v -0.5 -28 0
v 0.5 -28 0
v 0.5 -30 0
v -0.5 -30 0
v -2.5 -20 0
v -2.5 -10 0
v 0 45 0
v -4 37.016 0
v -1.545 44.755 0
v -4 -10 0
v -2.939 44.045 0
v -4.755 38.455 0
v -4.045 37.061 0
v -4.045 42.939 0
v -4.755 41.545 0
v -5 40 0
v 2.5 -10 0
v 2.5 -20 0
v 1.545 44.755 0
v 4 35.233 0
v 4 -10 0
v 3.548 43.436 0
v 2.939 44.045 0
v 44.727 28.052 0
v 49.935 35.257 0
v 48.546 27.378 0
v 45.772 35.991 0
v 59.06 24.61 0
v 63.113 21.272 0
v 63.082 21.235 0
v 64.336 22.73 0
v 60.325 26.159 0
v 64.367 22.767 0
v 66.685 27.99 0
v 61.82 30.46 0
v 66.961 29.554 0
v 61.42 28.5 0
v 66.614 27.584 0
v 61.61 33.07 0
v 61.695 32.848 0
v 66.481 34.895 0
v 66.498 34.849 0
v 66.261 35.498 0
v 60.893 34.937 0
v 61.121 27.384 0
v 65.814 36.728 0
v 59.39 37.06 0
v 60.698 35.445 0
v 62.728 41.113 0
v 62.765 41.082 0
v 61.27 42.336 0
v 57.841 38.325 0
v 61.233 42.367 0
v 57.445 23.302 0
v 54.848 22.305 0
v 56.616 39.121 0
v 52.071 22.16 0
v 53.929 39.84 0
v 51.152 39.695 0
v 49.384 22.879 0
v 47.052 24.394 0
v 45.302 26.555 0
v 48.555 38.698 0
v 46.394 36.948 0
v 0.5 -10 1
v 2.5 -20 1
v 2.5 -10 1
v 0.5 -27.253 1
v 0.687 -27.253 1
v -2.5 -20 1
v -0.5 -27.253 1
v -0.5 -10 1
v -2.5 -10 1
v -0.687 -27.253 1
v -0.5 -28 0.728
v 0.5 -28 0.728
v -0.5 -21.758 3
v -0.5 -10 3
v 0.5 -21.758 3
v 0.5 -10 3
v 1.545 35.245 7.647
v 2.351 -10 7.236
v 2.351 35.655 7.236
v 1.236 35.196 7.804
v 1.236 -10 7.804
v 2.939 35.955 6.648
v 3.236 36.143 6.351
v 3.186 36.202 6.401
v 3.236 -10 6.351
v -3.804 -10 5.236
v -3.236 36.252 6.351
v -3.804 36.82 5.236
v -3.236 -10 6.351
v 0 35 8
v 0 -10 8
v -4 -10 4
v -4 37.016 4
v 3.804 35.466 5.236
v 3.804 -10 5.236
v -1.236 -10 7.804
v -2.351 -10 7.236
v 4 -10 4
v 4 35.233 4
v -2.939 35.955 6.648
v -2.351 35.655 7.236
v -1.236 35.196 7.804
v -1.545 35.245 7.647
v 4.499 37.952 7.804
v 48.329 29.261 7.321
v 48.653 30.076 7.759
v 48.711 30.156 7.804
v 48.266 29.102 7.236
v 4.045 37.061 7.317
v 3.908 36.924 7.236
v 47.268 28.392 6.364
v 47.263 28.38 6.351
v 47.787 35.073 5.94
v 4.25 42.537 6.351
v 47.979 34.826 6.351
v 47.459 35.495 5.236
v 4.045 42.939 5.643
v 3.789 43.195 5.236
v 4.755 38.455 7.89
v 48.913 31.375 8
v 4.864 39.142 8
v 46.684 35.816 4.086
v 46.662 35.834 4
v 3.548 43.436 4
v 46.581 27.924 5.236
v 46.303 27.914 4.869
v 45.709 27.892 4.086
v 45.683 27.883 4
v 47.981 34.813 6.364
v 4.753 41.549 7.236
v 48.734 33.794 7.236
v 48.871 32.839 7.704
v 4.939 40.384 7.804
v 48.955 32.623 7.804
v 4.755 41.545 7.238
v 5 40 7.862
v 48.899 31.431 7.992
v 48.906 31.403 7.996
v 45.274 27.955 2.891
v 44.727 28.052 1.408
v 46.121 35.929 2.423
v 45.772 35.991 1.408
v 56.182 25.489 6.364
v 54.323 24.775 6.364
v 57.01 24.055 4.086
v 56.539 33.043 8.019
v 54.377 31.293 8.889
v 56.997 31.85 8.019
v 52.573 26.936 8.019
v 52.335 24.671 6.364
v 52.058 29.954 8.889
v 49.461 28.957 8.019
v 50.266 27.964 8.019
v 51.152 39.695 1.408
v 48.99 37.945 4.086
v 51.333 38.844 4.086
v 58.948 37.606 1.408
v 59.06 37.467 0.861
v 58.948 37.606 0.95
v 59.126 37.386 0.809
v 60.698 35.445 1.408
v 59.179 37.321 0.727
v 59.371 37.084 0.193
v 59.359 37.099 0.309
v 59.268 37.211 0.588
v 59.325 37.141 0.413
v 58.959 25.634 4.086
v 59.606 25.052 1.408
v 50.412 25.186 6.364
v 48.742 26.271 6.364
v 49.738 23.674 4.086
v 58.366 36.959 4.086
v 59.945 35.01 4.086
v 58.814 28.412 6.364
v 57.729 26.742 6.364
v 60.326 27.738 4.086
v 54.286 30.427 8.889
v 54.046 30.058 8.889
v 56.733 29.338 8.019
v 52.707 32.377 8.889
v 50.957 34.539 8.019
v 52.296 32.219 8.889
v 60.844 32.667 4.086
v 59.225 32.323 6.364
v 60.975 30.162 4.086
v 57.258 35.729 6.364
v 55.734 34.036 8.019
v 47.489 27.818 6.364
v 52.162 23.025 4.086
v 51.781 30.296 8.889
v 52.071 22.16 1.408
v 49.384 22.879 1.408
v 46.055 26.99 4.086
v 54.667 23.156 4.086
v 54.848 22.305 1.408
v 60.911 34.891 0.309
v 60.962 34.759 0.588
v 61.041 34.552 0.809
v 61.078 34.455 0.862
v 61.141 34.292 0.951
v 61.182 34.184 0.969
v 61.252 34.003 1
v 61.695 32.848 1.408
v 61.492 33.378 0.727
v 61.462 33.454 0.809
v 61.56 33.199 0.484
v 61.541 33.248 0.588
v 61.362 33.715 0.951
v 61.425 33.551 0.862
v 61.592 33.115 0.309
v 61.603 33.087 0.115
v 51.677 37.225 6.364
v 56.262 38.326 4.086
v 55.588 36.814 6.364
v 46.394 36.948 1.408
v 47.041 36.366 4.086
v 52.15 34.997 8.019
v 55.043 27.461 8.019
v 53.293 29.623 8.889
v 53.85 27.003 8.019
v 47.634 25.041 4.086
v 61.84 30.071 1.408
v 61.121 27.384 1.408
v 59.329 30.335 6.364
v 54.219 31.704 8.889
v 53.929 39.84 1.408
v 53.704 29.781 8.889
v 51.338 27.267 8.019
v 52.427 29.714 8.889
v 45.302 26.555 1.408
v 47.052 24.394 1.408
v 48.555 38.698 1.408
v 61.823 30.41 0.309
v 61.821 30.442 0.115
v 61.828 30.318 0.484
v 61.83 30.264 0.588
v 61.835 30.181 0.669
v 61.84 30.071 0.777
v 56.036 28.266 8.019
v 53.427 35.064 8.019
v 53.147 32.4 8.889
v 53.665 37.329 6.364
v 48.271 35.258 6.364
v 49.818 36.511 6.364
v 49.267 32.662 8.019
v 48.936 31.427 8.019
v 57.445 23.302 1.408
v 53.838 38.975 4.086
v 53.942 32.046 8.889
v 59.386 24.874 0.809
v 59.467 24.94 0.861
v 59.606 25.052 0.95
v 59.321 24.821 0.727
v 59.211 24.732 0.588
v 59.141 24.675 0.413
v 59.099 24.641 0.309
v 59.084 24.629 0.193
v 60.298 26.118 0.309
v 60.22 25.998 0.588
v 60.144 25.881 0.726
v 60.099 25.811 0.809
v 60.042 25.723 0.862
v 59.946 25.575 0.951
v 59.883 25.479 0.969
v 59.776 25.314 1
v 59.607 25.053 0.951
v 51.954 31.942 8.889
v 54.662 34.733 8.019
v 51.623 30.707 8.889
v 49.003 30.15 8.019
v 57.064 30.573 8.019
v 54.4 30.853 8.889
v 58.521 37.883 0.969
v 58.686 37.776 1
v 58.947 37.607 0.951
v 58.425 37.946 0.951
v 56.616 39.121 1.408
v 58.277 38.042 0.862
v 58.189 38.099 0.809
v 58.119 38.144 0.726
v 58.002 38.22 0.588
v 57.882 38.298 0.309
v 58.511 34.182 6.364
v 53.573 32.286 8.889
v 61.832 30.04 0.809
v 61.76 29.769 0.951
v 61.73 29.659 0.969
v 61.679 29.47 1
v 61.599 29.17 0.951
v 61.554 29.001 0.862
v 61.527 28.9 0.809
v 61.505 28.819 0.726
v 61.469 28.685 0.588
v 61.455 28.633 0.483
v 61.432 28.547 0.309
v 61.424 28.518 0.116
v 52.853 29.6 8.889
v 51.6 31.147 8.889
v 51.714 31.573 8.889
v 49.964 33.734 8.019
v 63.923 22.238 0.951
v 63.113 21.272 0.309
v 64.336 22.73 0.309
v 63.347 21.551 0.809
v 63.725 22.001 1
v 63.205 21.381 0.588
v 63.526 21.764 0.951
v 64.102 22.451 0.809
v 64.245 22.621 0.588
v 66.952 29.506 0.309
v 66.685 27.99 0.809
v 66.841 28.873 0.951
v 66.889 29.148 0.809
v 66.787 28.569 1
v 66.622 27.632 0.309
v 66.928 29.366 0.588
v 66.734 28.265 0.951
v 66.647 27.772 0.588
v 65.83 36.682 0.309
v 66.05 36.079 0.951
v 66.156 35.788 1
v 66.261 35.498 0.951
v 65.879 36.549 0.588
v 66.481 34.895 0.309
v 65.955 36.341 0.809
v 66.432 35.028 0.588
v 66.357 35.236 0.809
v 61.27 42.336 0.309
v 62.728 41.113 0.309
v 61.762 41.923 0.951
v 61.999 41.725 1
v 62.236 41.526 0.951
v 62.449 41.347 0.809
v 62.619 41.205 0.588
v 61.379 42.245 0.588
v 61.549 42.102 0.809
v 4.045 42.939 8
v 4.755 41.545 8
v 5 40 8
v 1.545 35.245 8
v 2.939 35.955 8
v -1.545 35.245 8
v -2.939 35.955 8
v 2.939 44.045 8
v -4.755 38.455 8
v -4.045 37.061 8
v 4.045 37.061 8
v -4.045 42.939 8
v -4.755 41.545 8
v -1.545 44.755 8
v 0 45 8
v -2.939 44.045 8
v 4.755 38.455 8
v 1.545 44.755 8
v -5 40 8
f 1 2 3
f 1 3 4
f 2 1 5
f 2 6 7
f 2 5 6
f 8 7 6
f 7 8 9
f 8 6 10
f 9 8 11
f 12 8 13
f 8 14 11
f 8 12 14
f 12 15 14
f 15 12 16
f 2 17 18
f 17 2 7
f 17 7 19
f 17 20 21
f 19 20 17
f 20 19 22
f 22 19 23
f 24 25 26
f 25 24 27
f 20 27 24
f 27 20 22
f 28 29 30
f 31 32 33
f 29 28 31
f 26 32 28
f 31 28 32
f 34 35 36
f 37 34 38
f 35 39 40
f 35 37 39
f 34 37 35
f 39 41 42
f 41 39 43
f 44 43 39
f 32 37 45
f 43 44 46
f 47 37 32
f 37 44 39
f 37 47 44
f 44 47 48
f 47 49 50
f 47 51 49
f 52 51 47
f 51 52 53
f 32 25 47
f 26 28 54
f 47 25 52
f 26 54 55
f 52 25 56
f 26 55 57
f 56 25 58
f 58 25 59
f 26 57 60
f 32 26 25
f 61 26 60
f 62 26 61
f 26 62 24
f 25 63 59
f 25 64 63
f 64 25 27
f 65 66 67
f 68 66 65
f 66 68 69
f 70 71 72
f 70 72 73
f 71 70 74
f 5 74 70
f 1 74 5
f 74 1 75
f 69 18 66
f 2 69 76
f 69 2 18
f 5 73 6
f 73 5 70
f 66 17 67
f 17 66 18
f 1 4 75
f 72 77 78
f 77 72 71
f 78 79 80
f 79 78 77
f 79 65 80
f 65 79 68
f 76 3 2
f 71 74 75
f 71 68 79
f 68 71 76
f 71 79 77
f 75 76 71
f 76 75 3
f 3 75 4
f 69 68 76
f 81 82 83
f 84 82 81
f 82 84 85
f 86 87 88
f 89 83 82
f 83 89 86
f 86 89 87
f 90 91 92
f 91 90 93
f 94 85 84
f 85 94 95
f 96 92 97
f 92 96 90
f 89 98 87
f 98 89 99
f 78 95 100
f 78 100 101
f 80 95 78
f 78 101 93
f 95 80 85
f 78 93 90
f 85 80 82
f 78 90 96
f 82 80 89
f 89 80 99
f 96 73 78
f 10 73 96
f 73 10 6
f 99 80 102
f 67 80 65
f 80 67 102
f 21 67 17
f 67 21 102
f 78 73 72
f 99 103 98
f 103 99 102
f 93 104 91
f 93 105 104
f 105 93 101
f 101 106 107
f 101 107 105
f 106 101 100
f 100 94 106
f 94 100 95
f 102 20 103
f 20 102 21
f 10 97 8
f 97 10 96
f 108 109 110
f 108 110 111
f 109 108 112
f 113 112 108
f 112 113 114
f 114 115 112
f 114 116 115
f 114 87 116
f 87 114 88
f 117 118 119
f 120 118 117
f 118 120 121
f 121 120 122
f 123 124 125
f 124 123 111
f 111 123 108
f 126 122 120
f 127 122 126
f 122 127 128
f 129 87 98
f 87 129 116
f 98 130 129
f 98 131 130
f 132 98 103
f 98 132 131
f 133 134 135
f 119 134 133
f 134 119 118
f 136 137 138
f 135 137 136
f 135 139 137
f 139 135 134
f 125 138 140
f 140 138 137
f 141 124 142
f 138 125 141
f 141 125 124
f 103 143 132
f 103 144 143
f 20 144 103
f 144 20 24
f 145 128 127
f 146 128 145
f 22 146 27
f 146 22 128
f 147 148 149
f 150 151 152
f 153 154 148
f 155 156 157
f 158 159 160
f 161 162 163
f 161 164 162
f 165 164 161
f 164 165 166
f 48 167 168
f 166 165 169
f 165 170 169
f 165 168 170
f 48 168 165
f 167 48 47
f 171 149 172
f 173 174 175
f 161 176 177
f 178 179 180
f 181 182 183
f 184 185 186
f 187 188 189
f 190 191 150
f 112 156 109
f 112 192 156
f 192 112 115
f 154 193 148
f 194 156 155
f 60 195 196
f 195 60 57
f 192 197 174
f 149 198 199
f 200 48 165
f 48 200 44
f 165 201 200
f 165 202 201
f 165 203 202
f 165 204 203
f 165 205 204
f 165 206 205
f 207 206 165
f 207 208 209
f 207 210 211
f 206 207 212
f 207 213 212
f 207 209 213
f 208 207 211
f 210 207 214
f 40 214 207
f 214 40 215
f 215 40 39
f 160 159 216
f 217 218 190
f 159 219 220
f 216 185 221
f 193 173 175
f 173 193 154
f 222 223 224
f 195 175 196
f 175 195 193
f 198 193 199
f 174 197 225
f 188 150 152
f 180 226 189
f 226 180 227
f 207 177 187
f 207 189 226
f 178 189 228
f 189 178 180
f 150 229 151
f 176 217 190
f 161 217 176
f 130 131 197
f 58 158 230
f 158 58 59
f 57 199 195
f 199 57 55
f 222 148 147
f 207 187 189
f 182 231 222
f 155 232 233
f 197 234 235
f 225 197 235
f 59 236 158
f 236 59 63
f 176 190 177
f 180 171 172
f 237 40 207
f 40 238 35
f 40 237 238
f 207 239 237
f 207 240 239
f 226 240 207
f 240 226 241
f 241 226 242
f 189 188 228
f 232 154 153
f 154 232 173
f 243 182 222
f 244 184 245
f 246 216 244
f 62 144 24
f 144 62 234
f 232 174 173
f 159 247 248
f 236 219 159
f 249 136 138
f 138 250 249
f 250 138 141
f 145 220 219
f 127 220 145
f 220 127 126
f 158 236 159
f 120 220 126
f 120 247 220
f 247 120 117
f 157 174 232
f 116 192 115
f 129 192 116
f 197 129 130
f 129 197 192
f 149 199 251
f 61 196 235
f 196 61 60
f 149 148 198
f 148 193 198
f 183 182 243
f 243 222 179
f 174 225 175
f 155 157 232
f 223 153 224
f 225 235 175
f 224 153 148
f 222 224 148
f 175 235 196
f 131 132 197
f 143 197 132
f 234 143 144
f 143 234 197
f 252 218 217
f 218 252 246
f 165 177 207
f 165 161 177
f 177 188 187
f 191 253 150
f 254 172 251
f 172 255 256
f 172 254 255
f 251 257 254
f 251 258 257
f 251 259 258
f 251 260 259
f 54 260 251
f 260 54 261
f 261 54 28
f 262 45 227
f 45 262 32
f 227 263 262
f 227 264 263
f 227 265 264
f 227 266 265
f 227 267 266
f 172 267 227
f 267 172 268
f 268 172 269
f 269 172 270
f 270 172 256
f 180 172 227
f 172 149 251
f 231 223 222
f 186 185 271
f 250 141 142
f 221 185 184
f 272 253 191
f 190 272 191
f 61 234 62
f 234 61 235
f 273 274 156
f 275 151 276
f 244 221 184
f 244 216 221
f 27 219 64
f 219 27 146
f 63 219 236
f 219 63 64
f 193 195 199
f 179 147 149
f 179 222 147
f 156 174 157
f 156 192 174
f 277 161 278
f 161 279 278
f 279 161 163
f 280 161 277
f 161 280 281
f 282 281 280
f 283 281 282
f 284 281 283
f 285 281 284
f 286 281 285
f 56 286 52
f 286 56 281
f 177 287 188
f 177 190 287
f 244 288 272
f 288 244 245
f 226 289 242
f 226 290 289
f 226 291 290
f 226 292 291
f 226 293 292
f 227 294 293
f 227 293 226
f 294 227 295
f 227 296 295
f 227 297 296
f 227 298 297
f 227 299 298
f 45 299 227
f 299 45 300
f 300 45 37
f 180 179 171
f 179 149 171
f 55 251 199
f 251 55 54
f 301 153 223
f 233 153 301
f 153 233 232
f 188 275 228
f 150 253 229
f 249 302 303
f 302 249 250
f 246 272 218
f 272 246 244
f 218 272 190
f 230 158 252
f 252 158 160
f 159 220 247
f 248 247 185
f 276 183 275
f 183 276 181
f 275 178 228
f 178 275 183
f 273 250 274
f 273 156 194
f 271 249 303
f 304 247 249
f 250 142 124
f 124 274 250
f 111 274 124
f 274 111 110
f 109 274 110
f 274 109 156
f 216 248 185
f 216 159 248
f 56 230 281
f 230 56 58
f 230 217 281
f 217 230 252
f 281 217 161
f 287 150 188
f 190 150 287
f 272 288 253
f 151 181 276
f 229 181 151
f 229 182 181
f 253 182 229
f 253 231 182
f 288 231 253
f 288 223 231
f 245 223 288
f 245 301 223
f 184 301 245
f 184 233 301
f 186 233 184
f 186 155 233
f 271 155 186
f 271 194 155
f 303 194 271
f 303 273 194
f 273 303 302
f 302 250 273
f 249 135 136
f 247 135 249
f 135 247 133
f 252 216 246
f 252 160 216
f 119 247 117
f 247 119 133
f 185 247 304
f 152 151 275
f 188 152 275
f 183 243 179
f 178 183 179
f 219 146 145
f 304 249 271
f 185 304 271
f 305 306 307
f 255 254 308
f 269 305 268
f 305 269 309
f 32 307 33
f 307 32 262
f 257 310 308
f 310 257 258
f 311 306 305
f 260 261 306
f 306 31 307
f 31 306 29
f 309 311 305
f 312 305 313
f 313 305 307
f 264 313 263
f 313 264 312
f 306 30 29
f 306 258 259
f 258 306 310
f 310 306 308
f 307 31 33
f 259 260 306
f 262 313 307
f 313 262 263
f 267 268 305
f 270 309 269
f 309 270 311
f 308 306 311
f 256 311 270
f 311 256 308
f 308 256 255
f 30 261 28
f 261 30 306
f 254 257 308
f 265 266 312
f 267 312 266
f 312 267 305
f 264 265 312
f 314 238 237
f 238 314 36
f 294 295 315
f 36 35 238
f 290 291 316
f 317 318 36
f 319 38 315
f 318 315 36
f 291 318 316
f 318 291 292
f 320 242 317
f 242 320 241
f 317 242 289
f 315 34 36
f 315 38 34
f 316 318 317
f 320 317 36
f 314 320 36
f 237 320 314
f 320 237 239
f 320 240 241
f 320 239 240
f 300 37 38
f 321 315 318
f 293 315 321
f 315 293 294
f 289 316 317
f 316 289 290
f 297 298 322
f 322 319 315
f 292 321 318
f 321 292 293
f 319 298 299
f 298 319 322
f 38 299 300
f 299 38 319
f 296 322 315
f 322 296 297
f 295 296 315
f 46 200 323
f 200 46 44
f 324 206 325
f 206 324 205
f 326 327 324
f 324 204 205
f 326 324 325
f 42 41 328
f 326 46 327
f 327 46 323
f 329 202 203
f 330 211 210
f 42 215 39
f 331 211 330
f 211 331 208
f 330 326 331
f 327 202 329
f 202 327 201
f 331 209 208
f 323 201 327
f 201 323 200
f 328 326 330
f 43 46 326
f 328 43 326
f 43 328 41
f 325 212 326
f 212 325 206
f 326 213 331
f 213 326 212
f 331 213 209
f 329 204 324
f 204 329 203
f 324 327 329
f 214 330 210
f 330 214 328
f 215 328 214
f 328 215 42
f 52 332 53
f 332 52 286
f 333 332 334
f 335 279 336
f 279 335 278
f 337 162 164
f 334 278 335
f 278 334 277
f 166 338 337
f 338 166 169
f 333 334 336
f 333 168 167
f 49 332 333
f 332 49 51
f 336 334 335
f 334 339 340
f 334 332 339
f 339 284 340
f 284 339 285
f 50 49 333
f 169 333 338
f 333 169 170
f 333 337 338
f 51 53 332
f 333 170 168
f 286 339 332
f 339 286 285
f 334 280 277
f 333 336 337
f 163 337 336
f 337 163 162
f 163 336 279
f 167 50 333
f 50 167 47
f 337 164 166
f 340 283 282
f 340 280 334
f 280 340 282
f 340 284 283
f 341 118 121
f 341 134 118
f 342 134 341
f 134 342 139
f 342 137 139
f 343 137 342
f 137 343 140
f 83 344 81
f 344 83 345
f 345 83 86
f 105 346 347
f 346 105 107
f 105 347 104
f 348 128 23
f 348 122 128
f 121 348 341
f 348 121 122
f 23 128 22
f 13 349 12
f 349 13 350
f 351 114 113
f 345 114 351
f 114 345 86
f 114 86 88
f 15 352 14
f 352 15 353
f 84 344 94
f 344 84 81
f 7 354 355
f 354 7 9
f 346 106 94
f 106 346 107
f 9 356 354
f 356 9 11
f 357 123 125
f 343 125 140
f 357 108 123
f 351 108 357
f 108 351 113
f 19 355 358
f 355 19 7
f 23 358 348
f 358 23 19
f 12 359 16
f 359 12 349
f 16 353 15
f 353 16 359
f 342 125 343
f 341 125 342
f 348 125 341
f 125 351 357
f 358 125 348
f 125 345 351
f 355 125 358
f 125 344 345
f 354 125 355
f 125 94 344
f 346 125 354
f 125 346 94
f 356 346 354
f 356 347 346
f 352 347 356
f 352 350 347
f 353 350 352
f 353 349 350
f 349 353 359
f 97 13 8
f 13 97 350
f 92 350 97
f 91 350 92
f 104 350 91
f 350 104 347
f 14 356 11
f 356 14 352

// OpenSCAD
PEG_OVERALL_LENGTH = 30;
PEG_POINT_LENGTH = 10;
PEG_POINT_SPINE_ANGLE = 20;
PEG_WIDTH = 5;
PEG_THICKNESS = 1;
PEG_SPINE_HEIGHT = 3;

ARM_DIAMETER = 8;
ELBOW_DIAMETER = 10;
HAND_DIAMETER = 18;
FINGER_DIAMETER = 2;

DETAIL = 20;

module point()
{
    linear_extrude(height = PEG_THICKNESS, center = false, convexity = 3, twist = 0, slices = DETAIL)
        polygon(points=[[PEG_WIDTH / -2, 0],[PEG_WIDTH / 2, 0],[0, PEG_POINT_LENGTH]]);
}

module body()
{
    union()
    {
        // Point    
        translate(v = [0, PEG_OVERALL_LENGTH - PEG_POINT_LENGTH, 0])
            point();
        // Main body
        translate(v = [PEG_WIDTH / -2, 0, 0])
            cube(size = [PEG_WIDTH, PEG_OVERALL_LENGTH - PEG_POINT_LENGTH, PEG_THICKNESS]);
        // Spine
        translate(v = [PEG_THICKNESS / -2, 0, 0])
            cube(size = [PEG_THICKNESS, PEG_OVERALL_LENGTH, PEG_SPINE_HEIGHT]);
    }
}

module peg()
{
    difference()
    {
        body();
        translate(v = [-15, PEG_OVERALL_LENGTH, 0])
            rotate(a = [90 - PEG_POINT_SPINE_ANGLE, 0, 0])
                cube(size = [30, 30, 30]);
    }
}

module flat_stick(length)
{
    union()
    {
        translate(v = [0, 0, ARM_DIAMETER / 2])
            rotate(a = [-90, 0, 0])
                cylinder(r = ARM_DIAMETER / 2, h = length, $fn = DETAIL);
        translate(v = [ARM_DIAMETER / -2, 0, 0])
            cube(size = [ARM_DIAMETER, length, ARM_DIAMETER / 2]);
    }    
}

module hand()
{
    difference()
    {
        union()
        {
            // Palm
            sphere(r = HAND_DIAMETER / 2, $fn = DETAIL);
            // Fingers
            rotate(a = [90, 0, 200])
                cylinder(r = FINGER_DIAMETER / 2, h = ARM_DIAMETER / 2 + 10, $fn = DETAIL);
            rotate(a = [90, 0, 230])
                cylinder(r = FINGER_DIAMETER / 2, h = ARM_DIAMETER / 2 + 10, $fn = DETAIL);
            rotate(a = [90, 0, 260])
                cylinder(r = FINGER_DIAMETER / 2, h = ARM_DIAMETER / 2 + 10, $fn = DETAIL);
            rotate(a = [90, 0, 290])
                cylinder(r = FINGER_DIAMETER / 2, h = ARM_DIAMETER / 2 + 10, $fn = DETAIL);
        }
        translate(v = [-15, -15, -30])
            cube(size = [30, 30, 30]);
    }
}

union()
{
    // Peg
    rotate(a = [0, 0, 180])
        peg();
    // Upper arm
    translate(v = [0, -10, 0])
        flat_stick(50);
    // Elbow
    translate(v = [0, 40, 0])
        cylinder(r = ELBOW_DIAMETER / 2, h = ARM_DIAMETER, $fn = DETAIL);
    // Lower arm
    translate(v = [0, 40, 0])
        rotate(a = [0, 0, -100])
            flat_stick(50);
    translate(v = [53, 31, 0])
        rotate(a = [0, 0, 210])
            hand();
}
